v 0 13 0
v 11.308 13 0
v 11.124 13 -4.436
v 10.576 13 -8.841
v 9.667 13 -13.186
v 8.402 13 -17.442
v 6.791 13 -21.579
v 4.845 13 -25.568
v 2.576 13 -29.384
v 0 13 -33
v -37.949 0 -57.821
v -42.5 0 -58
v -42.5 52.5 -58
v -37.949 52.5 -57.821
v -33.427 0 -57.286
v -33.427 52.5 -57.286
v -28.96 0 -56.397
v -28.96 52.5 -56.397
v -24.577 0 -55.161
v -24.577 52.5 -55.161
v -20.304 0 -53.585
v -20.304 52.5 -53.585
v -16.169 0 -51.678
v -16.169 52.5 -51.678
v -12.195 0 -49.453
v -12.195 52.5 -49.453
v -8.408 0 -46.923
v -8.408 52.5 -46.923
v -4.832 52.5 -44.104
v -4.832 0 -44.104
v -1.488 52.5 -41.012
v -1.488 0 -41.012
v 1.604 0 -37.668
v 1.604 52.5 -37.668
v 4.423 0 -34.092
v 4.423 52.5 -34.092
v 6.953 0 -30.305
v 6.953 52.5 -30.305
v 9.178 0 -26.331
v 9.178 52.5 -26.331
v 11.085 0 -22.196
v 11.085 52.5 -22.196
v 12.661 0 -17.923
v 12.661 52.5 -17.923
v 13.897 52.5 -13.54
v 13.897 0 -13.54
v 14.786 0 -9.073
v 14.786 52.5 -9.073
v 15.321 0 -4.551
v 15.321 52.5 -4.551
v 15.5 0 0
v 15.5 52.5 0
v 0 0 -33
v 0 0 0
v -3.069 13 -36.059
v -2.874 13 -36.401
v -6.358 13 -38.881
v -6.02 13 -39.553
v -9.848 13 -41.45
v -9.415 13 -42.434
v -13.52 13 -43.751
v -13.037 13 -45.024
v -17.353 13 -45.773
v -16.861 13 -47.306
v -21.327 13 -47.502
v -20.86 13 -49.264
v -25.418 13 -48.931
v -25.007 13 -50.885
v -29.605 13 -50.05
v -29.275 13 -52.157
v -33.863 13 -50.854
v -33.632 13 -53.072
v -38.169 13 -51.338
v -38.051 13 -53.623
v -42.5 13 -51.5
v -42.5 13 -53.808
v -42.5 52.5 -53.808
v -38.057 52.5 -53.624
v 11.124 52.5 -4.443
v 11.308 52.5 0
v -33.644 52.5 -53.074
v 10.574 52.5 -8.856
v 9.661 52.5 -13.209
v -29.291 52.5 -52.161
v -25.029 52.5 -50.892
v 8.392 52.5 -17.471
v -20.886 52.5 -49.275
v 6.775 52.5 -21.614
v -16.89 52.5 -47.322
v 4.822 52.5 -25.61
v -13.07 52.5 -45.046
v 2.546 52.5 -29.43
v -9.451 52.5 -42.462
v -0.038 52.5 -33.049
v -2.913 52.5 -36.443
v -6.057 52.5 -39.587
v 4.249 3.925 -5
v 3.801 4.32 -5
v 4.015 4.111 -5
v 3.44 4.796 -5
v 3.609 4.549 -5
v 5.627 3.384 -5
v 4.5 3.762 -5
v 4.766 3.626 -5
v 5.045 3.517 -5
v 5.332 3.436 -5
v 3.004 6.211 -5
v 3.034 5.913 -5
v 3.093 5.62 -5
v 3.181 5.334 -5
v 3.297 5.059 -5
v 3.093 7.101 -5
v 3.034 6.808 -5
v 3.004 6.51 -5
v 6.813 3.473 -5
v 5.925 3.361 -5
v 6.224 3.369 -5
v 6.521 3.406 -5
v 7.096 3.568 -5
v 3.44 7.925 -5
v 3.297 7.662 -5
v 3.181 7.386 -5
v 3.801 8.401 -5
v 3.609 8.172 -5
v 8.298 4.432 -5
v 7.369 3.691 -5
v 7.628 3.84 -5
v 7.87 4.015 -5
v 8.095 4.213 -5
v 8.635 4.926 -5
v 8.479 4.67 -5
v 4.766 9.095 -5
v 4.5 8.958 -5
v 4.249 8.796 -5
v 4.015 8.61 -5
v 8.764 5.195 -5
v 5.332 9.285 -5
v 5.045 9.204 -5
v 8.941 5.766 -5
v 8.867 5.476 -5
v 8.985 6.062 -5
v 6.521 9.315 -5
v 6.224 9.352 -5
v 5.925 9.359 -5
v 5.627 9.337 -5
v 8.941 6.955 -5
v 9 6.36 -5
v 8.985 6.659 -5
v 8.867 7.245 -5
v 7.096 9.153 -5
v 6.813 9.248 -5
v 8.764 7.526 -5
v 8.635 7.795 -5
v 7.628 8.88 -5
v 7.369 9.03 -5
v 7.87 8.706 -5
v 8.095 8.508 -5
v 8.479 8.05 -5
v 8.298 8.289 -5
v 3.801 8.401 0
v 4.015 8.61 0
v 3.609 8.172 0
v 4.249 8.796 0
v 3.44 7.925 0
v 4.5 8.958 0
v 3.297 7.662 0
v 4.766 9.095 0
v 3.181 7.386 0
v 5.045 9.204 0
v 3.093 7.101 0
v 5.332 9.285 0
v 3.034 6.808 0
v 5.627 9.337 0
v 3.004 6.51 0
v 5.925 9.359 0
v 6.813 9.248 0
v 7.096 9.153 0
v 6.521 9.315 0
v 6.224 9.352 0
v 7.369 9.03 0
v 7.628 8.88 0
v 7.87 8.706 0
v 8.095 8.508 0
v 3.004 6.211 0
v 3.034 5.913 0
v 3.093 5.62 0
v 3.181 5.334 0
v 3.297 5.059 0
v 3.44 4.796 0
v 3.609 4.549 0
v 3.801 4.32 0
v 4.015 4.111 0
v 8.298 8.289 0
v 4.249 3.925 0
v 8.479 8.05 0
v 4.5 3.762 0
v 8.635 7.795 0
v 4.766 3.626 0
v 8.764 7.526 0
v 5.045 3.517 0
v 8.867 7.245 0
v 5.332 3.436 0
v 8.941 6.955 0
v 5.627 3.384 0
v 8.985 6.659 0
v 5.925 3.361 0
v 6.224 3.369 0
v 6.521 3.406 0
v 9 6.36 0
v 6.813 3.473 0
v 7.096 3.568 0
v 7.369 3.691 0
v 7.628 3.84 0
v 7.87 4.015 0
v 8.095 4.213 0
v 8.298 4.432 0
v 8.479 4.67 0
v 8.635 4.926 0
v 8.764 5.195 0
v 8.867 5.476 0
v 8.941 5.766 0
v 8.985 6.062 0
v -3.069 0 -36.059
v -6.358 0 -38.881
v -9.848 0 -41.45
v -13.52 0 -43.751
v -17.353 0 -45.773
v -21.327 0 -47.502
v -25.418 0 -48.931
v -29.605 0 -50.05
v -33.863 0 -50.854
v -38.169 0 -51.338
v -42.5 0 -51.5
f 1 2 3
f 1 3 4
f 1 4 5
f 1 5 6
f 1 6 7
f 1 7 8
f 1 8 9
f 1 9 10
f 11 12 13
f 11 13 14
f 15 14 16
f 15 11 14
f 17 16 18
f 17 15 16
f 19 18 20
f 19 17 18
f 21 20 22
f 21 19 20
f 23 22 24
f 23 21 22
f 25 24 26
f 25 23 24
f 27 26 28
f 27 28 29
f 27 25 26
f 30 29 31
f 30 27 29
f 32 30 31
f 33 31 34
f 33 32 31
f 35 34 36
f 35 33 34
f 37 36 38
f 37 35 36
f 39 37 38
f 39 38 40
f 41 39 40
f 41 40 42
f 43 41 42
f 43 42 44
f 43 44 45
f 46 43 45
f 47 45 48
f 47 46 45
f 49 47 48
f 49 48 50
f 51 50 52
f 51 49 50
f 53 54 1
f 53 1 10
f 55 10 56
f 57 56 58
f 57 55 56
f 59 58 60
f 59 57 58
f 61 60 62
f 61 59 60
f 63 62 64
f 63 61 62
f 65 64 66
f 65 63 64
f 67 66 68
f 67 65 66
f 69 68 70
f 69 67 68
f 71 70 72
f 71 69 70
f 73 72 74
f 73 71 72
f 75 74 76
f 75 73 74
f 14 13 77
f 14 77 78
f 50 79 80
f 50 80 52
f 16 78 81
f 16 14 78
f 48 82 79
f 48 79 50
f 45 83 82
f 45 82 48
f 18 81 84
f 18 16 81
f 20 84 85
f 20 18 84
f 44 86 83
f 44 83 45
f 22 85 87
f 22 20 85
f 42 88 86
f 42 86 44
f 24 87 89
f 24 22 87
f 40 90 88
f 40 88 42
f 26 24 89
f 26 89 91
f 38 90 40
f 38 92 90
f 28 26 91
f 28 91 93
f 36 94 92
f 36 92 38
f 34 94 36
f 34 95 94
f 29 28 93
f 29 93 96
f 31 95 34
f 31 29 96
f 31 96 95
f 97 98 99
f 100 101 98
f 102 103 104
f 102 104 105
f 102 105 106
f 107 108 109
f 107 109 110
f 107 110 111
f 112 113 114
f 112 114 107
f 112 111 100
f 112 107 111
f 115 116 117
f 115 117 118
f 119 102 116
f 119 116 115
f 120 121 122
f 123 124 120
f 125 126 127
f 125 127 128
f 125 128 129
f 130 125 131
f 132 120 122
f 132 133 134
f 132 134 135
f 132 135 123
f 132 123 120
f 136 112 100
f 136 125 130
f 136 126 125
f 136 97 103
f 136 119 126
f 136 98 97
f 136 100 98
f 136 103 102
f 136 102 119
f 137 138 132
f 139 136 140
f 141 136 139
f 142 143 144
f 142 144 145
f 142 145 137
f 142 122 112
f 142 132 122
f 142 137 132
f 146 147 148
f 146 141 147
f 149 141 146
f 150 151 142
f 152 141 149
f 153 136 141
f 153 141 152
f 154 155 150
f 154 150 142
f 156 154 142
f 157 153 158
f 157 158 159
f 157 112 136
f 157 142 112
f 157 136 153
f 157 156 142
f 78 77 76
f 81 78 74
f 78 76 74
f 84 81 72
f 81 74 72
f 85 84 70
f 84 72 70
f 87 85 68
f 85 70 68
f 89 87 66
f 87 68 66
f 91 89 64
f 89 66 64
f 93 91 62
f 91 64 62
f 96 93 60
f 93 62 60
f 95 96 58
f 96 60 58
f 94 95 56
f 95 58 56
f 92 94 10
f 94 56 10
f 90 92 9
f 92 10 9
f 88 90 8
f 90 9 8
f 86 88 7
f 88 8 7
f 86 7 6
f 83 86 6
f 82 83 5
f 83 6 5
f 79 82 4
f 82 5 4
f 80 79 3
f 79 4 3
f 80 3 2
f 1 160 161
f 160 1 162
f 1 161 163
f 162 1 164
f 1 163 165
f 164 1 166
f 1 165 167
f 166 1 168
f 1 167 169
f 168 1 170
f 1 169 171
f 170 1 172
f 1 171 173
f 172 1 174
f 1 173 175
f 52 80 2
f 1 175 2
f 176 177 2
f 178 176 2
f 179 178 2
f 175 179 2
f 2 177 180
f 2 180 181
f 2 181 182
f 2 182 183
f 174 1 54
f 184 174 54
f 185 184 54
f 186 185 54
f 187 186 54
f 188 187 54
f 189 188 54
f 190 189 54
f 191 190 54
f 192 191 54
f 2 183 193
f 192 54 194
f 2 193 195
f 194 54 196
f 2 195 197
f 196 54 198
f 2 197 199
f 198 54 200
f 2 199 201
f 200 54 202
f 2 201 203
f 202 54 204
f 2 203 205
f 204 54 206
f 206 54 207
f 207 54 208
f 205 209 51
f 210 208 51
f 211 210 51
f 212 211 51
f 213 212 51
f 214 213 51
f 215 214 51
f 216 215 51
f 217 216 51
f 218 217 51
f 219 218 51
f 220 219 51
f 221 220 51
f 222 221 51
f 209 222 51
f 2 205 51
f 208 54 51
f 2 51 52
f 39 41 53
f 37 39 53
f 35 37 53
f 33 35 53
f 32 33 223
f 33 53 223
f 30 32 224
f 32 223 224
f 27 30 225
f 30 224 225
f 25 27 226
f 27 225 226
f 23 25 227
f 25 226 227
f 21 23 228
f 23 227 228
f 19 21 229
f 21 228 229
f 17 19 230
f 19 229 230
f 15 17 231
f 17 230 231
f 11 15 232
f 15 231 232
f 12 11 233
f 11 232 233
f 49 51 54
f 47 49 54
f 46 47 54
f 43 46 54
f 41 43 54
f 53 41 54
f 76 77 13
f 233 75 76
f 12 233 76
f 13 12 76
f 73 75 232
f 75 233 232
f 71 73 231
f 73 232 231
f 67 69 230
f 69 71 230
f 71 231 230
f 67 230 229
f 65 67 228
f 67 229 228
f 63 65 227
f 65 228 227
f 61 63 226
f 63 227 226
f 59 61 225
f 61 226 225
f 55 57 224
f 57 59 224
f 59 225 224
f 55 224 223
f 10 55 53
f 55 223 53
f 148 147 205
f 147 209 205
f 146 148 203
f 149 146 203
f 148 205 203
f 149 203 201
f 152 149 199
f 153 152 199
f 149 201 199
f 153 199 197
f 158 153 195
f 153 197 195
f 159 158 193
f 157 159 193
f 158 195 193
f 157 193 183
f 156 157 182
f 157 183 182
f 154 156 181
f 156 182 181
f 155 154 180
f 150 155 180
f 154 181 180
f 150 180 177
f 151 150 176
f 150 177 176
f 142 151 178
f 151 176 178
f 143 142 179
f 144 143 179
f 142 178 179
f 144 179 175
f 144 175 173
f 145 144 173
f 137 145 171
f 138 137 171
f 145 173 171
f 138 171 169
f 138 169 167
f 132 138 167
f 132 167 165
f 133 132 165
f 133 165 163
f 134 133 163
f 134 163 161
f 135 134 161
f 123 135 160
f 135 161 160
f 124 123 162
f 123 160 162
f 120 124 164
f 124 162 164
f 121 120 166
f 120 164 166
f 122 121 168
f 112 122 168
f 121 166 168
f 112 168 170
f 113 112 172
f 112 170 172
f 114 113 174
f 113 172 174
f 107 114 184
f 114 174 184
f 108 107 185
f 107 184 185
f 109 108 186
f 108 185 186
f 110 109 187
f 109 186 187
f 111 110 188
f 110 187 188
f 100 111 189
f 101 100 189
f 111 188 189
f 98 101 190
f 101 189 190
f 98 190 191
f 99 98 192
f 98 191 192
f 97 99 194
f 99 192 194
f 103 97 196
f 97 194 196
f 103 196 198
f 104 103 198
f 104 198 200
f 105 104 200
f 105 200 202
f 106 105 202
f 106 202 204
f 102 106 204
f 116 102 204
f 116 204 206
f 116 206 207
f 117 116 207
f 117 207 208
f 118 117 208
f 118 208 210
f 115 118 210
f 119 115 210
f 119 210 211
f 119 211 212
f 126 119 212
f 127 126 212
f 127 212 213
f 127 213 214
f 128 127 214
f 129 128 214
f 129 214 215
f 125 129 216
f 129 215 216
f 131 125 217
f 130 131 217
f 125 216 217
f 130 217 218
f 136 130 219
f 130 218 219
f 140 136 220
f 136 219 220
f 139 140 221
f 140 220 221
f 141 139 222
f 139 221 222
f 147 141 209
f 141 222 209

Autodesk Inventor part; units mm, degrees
ref_plane "YZ Plane" through (0, 0, 0) normal (1, 0, 0) x (0, 1, 0)
ref_plane "XZ Plane" through (0, 0, 0) normal (0, 1, 0) x (-1, 0, 0)
ref_plane "XY Plane" through (0, 0, 0) normal (0, 0, 1) x (1, 0, 0)
sketch "Sketch1" plane through (0, 0, 0) normal (0, 1, 0) x (-1, 0, 0)
  line L0 (0, 0) -> (0, -33)
  line L1 (0, 0) -> (-12, 0)
  line L2 (0, 0) -> (42.5, 0)
  line L3 (42.5, 0) -> (42.5, -33)
  line L4 (0, -33) -> (42.5, -33)
  line L5 (42.5, -33) -> (42.5, -51.5)
  arc A0 (0, -33) -> (42.5, -51.5) centre (42.5, 6.5676) ccw
  line L6 (42.5, -51.5) -> (42.5, -58)
  circle A1 centre (42.5, 0) radius 58
  line L7 (-12, 0) -> (-15.5, 0)
  dimension "d0" = 33
  dimension "d1" = 42.5
  dimension "d2" = 18.5
  dimension "d3" = 6.5
extrude "Extrusion1" add sketch "Sketch1" along normal blind 13 contours L0 A0 L6 A1 L7 L1
sketch "Sketch2" plane through (0, 13, 0) normal (0, 1, 0) x (1, 0, 0)
  arc A0 (0, 33) -> (-42.5, 51.5) centre (-42.5, -6.5676) ccw projected
  line L0 (0, 33) -> (3.3114, 35.5712)
  arc A1 (15.5, 0) -> (-42.5, 58) centre (-42.5, 0) ccw projected
  circle A2 centre (-42.5, 0) radius 58
  circle A3 centre (-42.5, 0) radius 53.8075
  line L1 (-42.5, 58) -> (-42.5, 51.5) projected
  line L2 (-42.5, 53.8075) -> (-42.5, 58)
  line L3 (0, 0) -> (15.5, 0) projected
  line L4 (11.3075, 0) -> (15.5, 0)
  dimension "d6" = 4.1925
extrude "Extrusion2" add sketch "Sketch2" along normal blind 39.5 contours A3 L1 A1 L0 | L0 A1 L3 A3
sketch "Sketch4" plane through (-42.5, 0, -58) normal (-1, 0, 0) x (0, 0, 1)
  line L0 (16, 92) -> (58.5, 92) projected
  line L1 (58.5, 105) -> (0, 105) projected
  line L2 (16, 92) -> (4, 92)
  line L3 (4, 92) -> (4, 105)
  line L4 (4, 105) -> (16, 105)
  line L5 (16, 105) -> (16, 92)
  circle A0 centre (10, 98.5) radius 3
  point P0 (58, 0)
  point P1 (0.0003, 105)
  dimension "d15" = 12
  dimension "d16" = 6
extrude "Extrusion4" cut sketch "Sketch4" against normal blind 5 contours A0
sketch "Sketch5" plane through (0, 0, 0) normal (0, 0, 1) x (1, 0, 0)
  line L0 (0, 0) -> (15.5, 0) projected
  line L1 (0, 13) -> (11.3075, 13) projected
  line L2 (0, 0) -> (12, 0)
  line L3 (12, 0) -> (12, 13)
  line L4 (12, 13) -> (0, 13)
  line L5 (0, 13) -> (0, 0)
  circle A0 centre (6, 6.3604) radius 3
  dimension "d19" = 6
extrude "Extrusion5" cut sketch "Sketch5" against normal blind 5 contours A0
sketch "Sketch6" plane through (0, 52.5, 0) normal (0, 1, 0) x (1, 0, 0)
  arc A0 (15.5, 0) -> (-42.5, 58) centre (-42.5, 0) ccw projected
  line L0 (-42.5, 58) -> (-42.5, 0)
  line L1 (-42.5, 0) -> (15.5, 0)
  arc A1 (15.5, 0) -> (-42.5, 58) centre (-42.5, 0) ccw
  line L2 (-42.5, 0) -> (16, 0)
  line L3 (16, 0) -> (16, 58.5)
  line L4 (16, 58.5) -> (-42.5, 58.5)
  line L5 (-42.5, 58.5) -> (-42.5, 0)
  line L6 (-42.5, 0) -> (16, 58.5)
  arc A2 (0, 33) -> (-42.5, 51.5) centre (-42.5, -6.5676) ccw projected
  line L7 (-4.8553, 37.6447) -> (-1.4878, 41.0122)
  point P0 (0, 0)
ref_plane "Work Plane1" through (-4.8553, 52.5, -37.6447) normal (0.7071, 0, -0.7071) x (0, 1, 0)
properties part number "Conic_Cover"
